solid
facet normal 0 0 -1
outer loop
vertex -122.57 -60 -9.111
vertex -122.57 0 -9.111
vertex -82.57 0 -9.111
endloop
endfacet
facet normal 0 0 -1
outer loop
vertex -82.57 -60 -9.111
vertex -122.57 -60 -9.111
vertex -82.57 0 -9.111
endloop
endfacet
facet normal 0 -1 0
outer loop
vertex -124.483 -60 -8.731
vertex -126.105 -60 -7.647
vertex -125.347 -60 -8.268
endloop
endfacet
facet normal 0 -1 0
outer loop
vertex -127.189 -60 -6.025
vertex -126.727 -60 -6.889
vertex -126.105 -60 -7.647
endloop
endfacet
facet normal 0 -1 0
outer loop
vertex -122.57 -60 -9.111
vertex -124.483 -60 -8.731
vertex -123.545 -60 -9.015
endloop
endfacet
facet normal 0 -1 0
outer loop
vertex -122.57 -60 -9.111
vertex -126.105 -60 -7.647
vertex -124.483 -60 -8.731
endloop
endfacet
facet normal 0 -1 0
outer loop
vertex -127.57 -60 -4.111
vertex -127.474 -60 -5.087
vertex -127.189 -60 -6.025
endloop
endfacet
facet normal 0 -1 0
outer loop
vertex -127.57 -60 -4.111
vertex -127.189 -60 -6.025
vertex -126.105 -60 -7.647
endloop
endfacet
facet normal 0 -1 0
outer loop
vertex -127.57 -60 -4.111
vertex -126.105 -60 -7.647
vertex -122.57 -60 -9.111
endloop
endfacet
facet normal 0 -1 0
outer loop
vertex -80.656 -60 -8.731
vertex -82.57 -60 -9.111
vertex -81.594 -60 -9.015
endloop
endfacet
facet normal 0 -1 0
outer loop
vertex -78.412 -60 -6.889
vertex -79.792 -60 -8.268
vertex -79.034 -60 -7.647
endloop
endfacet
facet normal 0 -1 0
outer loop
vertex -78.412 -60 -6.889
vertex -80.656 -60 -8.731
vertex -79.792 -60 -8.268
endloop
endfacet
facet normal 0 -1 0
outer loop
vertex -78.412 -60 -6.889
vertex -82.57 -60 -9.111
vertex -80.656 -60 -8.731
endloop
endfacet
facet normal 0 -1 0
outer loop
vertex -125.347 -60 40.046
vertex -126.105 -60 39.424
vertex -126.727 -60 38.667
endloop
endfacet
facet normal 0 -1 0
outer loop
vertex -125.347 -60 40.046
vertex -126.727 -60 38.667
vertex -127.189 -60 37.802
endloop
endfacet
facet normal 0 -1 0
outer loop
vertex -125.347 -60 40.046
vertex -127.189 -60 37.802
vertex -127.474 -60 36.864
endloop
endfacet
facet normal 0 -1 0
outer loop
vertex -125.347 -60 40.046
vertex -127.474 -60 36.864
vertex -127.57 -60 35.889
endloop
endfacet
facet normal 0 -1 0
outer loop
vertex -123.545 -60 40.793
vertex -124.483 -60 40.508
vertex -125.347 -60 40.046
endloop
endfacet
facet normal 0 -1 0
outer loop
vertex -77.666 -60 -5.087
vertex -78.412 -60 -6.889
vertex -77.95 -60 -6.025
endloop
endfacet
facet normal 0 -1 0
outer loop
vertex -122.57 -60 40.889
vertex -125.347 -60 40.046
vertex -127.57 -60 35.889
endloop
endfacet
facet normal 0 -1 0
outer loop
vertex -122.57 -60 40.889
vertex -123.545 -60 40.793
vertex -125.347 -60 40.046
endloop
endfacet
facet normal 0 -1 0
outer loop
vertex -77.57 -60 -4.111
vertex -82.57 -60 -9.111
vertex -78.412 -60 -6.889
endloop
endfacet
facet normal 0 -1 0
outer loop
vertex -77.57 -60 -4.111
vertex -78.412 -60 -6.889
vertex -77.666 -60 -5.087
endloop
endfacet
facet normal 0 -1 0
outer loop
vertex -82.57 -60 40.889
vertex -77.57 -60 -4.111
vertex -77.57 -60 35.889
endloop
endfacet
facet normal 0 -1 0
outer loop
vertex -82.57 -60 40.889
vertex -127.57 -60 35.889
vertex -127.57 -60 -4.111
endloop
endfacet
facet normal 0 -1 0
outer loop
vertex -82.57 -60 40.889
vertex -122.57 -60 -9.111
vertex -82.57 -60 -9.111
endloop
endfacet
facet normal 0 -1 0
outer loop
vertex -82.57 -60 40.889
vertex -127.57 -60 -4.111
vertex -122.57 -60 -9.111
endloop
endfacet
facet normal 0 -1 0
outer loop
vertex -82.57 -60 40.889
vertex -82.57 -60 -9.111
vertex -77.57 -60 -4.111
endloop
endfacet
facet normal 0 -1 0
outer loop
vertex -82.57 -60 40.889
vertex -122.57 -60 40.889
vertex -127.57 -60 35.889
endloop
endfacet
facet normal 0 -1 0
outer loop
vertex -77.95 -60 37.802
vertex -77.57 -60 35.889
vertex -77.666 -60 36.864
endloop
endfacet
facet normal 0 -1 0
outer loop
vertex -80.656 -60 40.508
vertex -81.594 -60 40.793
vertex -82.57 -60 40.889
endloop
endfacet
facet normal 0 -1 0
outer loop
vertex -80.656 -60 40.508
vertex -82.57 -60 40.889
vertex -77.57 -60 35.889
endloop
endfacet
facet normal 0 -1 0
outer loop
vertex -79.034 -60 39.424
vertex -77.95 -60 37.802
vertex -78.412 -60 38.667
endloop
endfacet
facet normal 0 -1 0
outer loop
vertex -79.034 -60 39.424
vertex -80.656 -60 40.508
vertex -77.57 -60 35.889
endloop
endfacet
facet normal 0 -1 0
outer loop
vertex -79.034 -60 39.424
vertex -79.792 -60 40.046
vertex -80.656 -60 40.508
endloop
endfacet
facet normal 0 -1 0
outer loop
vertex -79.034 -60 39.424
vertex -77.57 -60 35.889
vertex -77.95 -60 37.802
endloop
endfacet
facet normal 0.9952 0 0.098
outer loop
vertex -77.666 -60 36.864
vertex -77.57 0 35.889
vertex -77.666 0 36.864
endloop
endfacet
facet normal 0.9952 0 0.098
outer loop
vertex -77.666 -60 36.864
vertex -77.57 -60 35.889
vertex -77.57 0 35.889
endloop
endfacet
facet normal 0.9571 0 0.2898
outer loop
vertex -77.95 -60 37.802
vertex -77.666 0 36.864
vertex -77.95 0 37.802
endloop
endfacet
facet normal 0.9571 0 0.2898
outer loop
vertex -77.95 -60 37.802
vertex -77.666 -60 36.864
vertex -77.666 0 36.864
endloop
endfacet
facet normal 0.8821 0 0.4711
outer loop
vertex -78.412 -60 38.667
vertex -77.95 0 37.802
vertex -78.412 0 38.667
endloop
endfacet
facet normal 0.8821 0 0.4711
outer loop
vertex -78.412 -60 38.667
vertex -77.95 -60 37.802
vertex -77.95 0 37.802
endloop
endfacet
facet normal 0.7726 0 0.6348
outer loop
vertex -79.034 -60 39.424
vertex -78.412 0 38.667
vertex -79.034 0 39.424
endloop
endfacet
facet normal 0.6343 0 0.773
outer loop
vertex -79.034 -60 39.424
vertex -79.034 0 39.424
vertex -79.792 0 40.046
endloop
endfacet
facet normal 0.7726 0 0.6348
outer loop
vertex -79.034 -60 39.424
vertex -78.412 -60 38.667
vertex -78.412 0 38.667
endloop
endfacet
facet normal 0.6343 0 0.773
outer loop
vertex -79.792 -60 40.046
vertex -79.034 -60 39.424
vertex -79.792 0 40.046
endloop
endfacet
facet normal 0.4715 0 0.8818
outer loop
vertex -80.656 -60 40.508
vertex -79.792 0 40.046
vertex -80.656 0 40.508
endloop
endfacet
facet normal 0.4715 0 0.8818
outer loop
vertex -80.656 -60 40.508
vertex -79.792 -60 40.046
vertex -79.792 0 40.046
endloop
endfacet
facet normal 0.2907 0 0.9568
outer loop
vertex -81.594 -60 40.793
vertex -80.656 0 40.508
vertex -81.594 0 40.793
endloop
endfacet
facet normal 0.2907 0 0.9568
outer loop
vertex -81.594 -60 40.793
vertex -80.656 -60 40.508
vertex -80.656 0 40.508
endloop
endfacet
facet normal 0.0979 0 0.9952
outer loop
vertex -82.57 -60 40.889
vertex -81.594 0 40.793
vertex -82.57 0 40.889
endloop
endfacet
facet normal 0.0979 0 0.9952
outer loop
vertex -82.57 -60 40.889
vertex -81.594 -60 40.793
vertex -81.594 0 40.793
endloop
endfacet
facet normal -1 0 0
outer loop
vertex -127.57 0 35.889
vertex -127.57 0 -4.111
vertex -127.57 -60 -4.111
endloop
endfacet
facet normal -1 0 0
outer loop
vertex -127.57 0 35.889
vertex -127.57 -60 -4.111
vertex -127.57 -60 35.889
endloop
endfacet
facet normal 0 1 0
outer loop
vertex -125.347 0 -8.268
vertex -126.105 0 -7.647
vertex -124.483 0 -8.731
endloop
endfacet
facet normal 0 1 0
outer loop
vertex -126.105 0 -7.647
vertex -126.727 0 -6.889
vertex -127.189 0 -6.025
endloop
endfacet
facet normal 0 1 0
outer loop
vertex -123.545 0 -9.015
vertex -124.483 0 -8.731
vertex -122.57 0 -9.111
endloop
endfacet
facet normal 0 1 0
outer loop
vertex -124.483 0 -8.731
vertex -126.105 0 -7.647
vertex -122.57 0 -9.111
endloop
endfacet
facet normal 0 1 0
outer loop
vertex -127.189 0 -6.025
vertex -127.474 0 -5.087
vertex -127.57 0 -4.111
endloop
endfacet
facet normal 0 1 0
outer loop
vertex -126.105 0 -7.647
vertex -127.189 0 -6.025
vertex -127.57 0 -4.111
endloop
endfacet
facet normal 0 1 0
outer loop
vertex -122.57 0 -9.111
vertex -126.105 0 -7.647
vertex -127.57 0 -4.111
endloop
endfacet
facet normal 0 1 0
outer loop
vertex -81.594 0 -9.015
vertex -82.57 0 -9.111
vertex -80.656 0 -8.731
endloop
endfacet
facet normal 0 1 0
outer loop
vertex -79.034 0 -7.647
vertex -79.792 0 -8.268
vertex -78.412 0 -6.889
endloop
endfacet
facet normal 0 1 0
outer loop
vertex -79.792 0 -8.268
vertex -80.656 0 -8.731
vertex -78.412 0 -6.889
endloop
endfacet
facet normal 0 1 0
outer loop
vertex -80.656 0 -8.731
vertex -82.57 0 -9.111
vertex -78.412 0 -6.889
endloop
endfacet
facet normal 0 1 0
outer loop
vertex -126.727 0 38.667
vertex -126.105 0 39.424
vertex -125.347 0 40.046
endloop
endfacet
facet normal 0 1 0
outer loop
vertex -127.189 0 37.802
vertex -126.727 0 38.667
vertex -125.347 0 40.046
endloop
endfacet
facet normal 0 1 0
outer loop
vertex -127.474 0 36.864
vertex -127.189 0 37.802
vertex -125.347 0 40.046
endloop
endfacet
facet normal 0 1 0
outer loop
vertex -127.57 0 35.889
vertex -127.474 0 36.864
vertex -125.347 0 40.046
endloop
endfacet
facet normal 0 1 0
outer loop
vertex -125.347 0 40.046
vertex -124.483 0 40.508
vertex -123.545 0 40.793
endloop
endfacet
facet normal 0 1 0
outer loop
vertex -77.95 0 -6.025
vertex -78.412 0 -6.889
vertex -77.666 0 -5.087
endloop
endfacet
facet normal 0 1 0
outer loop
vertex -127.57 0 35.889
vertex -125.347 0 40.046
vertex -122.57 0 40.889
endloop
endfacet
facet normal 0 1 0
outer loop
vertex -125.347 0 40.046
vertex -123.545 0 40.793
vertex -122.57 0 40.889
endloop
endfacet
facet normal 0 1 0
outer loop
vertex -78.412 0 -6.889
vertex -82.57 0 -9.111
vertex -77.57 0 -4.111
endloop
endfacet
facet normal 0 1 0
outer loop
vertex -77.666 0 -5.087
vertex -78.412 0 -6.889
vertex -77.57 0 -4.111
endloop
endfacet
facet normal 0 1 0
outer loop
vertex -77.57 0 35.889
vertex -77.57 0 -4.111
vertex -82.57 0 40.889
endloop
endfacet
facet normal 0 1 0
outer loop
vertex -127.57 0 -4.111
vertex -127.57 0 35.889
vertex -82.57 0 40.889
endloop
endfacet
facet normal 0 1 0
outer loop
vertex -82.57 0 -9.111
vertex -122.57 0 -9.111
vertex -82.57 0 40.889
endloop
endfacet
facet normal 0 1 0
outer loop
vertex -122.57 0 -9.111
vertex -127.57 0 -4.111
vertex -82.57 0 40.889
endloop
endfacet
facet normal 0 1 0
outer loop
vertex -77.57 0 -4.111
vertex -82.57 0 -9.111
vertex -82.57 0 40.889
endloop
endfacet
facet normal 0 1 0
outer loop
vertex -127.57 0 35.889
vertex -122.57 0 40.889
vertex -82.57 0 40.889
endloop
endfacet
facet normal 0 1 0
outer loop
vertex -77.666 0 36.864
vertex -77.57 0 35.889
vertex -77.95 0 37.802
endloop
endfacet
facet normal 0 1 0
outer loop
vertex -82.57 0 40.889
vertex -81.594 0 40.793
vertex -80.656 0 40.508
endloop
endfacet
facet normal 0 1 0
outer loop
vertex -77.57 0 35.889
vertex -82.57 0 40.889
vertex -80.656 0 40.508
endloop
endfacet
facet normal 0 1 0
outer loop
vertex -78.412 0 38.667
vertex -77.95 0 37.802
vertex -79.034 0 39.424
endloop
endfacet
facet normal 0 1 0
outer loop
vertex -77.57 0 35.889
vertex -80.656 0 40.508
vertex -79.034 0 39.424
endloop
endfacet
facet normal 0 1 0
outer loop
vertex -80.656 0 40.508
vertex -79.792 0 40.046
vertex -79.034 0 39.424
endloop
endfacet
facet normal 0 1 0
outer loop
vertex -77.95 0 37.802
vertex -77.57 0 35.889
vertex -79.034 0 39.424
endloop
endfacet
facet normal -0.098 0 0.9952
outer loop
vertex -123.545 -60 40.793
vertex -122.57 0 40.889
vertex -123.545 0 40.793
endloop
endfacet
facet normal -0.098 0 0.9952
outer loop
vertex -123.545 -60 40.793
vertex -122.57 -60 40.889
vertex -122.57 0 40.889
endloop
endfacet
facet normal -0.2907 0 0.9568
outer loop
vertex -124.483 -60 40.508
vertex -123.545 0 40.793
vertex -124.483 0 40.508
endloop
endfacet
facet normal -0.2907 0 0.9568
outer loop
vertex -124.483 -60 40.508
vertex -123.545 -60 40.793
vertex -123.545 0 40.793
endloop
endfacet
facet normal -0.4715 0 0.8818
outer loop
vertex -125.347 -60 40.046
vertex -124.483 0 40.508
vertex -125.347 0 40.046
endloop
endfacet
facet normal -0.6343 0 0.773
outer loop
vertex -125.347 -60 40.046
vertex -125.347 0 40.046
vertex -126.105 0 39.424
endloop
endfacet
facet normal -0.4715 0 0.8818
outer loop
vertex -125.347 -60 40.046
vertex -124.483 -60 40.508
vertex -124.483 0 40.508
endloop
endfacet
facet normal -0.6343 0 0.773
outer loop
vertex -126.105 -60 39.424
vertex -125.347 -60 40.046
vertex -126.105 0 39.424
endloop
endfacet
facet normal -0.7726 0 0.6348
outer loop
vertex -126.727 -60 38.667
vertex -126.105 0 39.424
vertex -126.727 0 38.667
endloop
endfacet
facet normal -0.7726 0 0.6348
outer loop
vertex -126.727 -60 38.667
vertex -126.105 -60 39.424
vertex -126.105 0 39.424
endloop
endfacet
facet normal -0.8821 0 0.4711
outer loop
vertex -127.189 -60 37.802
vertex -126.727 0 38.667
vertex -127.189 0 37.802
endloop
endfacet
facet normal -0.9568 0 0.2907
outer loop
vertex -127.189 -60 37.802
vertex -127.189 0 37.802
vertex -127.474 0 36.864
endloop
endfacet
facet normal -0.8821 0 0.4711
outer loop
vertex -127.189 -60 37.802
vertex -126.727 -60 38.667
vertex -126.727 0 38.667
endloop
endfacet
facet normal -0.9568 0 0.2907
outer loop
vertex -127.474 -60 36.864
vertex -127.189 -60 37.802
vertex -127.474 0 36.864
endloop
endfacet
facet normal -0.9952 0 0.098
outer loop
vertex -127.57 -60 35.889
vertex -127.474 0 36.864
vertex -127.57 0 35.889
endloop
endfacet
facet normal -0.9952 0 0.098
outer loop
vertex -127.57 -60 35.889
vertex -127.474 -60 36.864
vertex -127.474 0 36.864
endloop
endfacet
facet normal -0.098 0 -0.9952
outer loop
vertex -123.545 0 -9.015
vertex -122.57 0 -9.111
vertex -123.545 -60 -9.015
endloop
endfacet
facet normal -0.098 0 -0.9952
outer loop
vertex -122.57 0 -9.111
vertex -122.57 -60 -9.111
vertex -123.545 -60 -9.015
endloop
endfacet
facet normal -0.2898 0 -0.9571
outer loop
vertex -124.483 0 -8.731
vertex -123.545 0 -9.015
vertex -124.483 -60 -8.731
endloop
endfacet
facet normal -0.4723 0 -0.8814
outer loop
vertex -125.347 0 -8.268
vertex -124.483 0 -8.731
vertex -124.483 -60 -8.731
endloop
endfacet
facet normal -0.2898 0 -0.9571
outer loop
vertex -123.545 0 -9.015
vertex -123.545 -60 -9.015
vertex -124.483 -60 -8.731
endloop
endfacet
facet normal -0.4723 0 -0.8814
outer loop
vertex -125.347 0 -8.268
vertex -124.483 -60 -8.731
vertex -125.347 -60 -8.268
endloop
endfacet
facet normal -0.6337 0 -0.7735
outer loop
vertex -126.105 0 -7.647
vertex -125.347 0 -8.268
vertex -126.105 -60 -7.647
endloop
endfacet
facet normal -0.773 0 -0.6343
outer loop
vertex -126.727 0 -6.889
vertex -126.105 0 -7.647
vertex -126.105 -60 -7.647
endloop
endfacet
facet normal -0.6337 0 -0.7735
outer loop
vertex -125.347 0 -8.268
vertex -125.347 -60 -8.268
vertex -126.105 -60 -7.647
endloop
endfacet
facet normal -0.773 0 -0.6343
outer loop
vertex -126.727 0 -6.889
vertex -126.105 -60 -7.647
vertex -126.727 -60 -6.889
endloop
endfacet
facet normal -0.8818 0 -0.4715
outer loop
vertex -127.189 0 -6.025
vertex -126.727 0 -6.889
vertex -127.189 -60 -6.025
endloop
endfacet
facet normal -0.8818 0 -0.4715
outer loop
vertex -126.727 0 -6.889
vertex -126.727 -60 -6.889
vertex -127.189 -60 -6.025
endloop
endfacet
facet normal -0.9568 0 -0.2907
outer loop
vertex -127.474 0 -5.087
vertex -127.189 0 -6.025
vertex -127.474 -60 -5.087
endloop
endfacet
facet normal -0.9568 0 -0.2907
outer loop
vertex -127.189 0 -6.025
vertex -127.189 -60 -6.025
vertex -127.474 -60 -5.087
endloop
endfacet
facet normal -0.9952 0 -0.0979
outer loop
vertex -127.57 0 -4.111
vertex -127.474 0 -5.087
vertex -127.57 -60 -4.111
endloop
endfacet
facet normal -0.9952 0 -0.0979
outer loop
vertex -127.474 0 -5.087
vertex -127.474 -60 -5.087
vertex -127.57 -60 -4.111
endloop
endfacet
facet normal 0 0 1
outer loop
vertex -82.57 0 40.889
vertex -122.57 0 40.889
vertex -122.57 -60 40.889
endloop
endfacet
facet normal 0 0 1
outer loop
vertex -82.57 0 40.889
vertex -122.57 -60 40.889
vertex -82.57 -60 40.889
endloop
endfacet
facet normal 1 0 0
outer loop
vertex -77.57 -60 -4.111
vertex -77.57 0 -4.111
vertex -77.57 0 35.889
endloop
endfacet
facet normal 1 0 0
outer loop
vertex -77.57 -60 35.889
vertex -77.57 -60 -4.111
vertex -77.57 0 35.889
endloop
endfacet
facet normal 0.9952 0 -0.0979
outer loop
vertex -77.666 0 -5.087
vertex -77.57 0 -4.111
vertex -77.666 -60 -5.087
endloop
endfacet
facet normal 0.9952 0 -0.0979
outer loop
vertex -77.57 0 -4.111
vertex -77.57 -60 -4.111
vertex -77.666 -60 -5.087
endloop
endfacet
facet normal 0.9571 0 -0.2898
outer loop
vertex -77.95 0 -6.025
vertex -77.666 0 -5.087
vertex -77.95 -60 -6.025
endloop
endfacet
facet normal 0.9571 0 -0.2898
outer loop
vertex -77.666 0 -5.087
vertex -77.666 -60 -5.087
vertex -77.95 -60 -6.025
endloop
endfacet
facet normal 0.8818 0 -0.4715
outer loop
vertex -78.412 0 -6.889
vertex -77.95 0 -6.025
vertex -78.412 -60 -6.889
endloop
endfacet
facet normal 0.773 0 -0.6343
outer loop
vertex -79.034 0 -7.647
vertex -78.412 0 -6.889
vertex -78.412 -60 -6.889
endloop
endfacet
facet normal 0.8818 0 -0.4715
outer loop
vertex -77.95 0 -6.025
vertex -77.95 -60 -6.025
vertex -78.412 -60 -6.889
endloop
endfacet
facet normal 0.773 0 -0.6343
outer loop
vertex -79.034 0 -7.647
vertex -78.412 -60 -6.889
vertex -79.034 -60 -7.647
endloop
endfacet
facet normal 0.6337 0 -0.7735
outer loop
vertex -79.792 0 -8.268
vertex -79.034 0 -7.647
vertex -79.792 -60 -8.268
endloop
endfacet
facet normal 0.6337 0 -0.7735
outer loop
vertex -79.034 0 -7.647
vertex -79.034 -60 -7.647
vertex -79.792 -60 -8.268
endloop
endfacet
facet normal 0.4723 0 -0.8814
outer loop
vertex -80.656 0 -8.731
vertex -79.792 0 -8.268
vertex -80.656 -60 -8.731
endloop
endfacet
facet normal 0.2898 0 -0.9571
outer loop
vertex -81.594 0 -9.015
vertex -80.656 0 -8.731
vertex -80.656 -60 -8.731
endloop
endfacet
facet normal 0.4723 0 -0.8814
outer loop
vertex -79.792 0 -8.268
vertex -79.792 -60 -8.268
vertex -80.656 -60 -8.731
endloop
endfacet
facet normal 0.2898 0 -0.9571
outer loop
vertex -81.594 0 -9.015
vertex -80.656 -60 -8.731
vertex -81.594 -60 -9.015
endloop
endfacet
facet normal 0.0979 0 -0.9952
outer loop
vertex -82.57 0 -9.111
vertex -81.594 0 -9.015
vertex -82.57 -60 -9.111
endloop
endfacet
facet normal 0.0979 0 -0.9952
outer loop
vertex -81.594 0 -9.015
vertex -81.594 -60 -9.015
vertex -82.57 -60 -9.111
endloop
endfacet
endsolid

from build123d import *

# Parameters (mm, degrees)
F0_W     = 50
F0_H     = 50
F1_DEPTH = 60
F2_R     = 5
F3_R     = 5


with BuildPart() as f1:
    # F0 (on Front) → F1 (new body)
    with BuildSketch(Plane.XZ):
        with Locations((-102.569624, 15.888886)):
            Rectangle(F0_W, F0_H)
    extrude(amount=F1_DEPTH)

    # F2
    f2_edges = [f1.edges().sort_by_distance(p)[0] for p in [
        (-77.569624, -30, 40.888886),
    ]]
    fillet(f2_edges, radius=F2_R)

    # F3
    f3_edges = [f1.edges().sort_by_distance(p)[0] for p in [
        (-127.569624, -30, 40.888886),
        (-77.569624, -30, -9.111114),
        (-127.569624, -30, -9.111114),
    ]]
    fillet(f3_edges, radius=F3_R)


solid = f1.part
